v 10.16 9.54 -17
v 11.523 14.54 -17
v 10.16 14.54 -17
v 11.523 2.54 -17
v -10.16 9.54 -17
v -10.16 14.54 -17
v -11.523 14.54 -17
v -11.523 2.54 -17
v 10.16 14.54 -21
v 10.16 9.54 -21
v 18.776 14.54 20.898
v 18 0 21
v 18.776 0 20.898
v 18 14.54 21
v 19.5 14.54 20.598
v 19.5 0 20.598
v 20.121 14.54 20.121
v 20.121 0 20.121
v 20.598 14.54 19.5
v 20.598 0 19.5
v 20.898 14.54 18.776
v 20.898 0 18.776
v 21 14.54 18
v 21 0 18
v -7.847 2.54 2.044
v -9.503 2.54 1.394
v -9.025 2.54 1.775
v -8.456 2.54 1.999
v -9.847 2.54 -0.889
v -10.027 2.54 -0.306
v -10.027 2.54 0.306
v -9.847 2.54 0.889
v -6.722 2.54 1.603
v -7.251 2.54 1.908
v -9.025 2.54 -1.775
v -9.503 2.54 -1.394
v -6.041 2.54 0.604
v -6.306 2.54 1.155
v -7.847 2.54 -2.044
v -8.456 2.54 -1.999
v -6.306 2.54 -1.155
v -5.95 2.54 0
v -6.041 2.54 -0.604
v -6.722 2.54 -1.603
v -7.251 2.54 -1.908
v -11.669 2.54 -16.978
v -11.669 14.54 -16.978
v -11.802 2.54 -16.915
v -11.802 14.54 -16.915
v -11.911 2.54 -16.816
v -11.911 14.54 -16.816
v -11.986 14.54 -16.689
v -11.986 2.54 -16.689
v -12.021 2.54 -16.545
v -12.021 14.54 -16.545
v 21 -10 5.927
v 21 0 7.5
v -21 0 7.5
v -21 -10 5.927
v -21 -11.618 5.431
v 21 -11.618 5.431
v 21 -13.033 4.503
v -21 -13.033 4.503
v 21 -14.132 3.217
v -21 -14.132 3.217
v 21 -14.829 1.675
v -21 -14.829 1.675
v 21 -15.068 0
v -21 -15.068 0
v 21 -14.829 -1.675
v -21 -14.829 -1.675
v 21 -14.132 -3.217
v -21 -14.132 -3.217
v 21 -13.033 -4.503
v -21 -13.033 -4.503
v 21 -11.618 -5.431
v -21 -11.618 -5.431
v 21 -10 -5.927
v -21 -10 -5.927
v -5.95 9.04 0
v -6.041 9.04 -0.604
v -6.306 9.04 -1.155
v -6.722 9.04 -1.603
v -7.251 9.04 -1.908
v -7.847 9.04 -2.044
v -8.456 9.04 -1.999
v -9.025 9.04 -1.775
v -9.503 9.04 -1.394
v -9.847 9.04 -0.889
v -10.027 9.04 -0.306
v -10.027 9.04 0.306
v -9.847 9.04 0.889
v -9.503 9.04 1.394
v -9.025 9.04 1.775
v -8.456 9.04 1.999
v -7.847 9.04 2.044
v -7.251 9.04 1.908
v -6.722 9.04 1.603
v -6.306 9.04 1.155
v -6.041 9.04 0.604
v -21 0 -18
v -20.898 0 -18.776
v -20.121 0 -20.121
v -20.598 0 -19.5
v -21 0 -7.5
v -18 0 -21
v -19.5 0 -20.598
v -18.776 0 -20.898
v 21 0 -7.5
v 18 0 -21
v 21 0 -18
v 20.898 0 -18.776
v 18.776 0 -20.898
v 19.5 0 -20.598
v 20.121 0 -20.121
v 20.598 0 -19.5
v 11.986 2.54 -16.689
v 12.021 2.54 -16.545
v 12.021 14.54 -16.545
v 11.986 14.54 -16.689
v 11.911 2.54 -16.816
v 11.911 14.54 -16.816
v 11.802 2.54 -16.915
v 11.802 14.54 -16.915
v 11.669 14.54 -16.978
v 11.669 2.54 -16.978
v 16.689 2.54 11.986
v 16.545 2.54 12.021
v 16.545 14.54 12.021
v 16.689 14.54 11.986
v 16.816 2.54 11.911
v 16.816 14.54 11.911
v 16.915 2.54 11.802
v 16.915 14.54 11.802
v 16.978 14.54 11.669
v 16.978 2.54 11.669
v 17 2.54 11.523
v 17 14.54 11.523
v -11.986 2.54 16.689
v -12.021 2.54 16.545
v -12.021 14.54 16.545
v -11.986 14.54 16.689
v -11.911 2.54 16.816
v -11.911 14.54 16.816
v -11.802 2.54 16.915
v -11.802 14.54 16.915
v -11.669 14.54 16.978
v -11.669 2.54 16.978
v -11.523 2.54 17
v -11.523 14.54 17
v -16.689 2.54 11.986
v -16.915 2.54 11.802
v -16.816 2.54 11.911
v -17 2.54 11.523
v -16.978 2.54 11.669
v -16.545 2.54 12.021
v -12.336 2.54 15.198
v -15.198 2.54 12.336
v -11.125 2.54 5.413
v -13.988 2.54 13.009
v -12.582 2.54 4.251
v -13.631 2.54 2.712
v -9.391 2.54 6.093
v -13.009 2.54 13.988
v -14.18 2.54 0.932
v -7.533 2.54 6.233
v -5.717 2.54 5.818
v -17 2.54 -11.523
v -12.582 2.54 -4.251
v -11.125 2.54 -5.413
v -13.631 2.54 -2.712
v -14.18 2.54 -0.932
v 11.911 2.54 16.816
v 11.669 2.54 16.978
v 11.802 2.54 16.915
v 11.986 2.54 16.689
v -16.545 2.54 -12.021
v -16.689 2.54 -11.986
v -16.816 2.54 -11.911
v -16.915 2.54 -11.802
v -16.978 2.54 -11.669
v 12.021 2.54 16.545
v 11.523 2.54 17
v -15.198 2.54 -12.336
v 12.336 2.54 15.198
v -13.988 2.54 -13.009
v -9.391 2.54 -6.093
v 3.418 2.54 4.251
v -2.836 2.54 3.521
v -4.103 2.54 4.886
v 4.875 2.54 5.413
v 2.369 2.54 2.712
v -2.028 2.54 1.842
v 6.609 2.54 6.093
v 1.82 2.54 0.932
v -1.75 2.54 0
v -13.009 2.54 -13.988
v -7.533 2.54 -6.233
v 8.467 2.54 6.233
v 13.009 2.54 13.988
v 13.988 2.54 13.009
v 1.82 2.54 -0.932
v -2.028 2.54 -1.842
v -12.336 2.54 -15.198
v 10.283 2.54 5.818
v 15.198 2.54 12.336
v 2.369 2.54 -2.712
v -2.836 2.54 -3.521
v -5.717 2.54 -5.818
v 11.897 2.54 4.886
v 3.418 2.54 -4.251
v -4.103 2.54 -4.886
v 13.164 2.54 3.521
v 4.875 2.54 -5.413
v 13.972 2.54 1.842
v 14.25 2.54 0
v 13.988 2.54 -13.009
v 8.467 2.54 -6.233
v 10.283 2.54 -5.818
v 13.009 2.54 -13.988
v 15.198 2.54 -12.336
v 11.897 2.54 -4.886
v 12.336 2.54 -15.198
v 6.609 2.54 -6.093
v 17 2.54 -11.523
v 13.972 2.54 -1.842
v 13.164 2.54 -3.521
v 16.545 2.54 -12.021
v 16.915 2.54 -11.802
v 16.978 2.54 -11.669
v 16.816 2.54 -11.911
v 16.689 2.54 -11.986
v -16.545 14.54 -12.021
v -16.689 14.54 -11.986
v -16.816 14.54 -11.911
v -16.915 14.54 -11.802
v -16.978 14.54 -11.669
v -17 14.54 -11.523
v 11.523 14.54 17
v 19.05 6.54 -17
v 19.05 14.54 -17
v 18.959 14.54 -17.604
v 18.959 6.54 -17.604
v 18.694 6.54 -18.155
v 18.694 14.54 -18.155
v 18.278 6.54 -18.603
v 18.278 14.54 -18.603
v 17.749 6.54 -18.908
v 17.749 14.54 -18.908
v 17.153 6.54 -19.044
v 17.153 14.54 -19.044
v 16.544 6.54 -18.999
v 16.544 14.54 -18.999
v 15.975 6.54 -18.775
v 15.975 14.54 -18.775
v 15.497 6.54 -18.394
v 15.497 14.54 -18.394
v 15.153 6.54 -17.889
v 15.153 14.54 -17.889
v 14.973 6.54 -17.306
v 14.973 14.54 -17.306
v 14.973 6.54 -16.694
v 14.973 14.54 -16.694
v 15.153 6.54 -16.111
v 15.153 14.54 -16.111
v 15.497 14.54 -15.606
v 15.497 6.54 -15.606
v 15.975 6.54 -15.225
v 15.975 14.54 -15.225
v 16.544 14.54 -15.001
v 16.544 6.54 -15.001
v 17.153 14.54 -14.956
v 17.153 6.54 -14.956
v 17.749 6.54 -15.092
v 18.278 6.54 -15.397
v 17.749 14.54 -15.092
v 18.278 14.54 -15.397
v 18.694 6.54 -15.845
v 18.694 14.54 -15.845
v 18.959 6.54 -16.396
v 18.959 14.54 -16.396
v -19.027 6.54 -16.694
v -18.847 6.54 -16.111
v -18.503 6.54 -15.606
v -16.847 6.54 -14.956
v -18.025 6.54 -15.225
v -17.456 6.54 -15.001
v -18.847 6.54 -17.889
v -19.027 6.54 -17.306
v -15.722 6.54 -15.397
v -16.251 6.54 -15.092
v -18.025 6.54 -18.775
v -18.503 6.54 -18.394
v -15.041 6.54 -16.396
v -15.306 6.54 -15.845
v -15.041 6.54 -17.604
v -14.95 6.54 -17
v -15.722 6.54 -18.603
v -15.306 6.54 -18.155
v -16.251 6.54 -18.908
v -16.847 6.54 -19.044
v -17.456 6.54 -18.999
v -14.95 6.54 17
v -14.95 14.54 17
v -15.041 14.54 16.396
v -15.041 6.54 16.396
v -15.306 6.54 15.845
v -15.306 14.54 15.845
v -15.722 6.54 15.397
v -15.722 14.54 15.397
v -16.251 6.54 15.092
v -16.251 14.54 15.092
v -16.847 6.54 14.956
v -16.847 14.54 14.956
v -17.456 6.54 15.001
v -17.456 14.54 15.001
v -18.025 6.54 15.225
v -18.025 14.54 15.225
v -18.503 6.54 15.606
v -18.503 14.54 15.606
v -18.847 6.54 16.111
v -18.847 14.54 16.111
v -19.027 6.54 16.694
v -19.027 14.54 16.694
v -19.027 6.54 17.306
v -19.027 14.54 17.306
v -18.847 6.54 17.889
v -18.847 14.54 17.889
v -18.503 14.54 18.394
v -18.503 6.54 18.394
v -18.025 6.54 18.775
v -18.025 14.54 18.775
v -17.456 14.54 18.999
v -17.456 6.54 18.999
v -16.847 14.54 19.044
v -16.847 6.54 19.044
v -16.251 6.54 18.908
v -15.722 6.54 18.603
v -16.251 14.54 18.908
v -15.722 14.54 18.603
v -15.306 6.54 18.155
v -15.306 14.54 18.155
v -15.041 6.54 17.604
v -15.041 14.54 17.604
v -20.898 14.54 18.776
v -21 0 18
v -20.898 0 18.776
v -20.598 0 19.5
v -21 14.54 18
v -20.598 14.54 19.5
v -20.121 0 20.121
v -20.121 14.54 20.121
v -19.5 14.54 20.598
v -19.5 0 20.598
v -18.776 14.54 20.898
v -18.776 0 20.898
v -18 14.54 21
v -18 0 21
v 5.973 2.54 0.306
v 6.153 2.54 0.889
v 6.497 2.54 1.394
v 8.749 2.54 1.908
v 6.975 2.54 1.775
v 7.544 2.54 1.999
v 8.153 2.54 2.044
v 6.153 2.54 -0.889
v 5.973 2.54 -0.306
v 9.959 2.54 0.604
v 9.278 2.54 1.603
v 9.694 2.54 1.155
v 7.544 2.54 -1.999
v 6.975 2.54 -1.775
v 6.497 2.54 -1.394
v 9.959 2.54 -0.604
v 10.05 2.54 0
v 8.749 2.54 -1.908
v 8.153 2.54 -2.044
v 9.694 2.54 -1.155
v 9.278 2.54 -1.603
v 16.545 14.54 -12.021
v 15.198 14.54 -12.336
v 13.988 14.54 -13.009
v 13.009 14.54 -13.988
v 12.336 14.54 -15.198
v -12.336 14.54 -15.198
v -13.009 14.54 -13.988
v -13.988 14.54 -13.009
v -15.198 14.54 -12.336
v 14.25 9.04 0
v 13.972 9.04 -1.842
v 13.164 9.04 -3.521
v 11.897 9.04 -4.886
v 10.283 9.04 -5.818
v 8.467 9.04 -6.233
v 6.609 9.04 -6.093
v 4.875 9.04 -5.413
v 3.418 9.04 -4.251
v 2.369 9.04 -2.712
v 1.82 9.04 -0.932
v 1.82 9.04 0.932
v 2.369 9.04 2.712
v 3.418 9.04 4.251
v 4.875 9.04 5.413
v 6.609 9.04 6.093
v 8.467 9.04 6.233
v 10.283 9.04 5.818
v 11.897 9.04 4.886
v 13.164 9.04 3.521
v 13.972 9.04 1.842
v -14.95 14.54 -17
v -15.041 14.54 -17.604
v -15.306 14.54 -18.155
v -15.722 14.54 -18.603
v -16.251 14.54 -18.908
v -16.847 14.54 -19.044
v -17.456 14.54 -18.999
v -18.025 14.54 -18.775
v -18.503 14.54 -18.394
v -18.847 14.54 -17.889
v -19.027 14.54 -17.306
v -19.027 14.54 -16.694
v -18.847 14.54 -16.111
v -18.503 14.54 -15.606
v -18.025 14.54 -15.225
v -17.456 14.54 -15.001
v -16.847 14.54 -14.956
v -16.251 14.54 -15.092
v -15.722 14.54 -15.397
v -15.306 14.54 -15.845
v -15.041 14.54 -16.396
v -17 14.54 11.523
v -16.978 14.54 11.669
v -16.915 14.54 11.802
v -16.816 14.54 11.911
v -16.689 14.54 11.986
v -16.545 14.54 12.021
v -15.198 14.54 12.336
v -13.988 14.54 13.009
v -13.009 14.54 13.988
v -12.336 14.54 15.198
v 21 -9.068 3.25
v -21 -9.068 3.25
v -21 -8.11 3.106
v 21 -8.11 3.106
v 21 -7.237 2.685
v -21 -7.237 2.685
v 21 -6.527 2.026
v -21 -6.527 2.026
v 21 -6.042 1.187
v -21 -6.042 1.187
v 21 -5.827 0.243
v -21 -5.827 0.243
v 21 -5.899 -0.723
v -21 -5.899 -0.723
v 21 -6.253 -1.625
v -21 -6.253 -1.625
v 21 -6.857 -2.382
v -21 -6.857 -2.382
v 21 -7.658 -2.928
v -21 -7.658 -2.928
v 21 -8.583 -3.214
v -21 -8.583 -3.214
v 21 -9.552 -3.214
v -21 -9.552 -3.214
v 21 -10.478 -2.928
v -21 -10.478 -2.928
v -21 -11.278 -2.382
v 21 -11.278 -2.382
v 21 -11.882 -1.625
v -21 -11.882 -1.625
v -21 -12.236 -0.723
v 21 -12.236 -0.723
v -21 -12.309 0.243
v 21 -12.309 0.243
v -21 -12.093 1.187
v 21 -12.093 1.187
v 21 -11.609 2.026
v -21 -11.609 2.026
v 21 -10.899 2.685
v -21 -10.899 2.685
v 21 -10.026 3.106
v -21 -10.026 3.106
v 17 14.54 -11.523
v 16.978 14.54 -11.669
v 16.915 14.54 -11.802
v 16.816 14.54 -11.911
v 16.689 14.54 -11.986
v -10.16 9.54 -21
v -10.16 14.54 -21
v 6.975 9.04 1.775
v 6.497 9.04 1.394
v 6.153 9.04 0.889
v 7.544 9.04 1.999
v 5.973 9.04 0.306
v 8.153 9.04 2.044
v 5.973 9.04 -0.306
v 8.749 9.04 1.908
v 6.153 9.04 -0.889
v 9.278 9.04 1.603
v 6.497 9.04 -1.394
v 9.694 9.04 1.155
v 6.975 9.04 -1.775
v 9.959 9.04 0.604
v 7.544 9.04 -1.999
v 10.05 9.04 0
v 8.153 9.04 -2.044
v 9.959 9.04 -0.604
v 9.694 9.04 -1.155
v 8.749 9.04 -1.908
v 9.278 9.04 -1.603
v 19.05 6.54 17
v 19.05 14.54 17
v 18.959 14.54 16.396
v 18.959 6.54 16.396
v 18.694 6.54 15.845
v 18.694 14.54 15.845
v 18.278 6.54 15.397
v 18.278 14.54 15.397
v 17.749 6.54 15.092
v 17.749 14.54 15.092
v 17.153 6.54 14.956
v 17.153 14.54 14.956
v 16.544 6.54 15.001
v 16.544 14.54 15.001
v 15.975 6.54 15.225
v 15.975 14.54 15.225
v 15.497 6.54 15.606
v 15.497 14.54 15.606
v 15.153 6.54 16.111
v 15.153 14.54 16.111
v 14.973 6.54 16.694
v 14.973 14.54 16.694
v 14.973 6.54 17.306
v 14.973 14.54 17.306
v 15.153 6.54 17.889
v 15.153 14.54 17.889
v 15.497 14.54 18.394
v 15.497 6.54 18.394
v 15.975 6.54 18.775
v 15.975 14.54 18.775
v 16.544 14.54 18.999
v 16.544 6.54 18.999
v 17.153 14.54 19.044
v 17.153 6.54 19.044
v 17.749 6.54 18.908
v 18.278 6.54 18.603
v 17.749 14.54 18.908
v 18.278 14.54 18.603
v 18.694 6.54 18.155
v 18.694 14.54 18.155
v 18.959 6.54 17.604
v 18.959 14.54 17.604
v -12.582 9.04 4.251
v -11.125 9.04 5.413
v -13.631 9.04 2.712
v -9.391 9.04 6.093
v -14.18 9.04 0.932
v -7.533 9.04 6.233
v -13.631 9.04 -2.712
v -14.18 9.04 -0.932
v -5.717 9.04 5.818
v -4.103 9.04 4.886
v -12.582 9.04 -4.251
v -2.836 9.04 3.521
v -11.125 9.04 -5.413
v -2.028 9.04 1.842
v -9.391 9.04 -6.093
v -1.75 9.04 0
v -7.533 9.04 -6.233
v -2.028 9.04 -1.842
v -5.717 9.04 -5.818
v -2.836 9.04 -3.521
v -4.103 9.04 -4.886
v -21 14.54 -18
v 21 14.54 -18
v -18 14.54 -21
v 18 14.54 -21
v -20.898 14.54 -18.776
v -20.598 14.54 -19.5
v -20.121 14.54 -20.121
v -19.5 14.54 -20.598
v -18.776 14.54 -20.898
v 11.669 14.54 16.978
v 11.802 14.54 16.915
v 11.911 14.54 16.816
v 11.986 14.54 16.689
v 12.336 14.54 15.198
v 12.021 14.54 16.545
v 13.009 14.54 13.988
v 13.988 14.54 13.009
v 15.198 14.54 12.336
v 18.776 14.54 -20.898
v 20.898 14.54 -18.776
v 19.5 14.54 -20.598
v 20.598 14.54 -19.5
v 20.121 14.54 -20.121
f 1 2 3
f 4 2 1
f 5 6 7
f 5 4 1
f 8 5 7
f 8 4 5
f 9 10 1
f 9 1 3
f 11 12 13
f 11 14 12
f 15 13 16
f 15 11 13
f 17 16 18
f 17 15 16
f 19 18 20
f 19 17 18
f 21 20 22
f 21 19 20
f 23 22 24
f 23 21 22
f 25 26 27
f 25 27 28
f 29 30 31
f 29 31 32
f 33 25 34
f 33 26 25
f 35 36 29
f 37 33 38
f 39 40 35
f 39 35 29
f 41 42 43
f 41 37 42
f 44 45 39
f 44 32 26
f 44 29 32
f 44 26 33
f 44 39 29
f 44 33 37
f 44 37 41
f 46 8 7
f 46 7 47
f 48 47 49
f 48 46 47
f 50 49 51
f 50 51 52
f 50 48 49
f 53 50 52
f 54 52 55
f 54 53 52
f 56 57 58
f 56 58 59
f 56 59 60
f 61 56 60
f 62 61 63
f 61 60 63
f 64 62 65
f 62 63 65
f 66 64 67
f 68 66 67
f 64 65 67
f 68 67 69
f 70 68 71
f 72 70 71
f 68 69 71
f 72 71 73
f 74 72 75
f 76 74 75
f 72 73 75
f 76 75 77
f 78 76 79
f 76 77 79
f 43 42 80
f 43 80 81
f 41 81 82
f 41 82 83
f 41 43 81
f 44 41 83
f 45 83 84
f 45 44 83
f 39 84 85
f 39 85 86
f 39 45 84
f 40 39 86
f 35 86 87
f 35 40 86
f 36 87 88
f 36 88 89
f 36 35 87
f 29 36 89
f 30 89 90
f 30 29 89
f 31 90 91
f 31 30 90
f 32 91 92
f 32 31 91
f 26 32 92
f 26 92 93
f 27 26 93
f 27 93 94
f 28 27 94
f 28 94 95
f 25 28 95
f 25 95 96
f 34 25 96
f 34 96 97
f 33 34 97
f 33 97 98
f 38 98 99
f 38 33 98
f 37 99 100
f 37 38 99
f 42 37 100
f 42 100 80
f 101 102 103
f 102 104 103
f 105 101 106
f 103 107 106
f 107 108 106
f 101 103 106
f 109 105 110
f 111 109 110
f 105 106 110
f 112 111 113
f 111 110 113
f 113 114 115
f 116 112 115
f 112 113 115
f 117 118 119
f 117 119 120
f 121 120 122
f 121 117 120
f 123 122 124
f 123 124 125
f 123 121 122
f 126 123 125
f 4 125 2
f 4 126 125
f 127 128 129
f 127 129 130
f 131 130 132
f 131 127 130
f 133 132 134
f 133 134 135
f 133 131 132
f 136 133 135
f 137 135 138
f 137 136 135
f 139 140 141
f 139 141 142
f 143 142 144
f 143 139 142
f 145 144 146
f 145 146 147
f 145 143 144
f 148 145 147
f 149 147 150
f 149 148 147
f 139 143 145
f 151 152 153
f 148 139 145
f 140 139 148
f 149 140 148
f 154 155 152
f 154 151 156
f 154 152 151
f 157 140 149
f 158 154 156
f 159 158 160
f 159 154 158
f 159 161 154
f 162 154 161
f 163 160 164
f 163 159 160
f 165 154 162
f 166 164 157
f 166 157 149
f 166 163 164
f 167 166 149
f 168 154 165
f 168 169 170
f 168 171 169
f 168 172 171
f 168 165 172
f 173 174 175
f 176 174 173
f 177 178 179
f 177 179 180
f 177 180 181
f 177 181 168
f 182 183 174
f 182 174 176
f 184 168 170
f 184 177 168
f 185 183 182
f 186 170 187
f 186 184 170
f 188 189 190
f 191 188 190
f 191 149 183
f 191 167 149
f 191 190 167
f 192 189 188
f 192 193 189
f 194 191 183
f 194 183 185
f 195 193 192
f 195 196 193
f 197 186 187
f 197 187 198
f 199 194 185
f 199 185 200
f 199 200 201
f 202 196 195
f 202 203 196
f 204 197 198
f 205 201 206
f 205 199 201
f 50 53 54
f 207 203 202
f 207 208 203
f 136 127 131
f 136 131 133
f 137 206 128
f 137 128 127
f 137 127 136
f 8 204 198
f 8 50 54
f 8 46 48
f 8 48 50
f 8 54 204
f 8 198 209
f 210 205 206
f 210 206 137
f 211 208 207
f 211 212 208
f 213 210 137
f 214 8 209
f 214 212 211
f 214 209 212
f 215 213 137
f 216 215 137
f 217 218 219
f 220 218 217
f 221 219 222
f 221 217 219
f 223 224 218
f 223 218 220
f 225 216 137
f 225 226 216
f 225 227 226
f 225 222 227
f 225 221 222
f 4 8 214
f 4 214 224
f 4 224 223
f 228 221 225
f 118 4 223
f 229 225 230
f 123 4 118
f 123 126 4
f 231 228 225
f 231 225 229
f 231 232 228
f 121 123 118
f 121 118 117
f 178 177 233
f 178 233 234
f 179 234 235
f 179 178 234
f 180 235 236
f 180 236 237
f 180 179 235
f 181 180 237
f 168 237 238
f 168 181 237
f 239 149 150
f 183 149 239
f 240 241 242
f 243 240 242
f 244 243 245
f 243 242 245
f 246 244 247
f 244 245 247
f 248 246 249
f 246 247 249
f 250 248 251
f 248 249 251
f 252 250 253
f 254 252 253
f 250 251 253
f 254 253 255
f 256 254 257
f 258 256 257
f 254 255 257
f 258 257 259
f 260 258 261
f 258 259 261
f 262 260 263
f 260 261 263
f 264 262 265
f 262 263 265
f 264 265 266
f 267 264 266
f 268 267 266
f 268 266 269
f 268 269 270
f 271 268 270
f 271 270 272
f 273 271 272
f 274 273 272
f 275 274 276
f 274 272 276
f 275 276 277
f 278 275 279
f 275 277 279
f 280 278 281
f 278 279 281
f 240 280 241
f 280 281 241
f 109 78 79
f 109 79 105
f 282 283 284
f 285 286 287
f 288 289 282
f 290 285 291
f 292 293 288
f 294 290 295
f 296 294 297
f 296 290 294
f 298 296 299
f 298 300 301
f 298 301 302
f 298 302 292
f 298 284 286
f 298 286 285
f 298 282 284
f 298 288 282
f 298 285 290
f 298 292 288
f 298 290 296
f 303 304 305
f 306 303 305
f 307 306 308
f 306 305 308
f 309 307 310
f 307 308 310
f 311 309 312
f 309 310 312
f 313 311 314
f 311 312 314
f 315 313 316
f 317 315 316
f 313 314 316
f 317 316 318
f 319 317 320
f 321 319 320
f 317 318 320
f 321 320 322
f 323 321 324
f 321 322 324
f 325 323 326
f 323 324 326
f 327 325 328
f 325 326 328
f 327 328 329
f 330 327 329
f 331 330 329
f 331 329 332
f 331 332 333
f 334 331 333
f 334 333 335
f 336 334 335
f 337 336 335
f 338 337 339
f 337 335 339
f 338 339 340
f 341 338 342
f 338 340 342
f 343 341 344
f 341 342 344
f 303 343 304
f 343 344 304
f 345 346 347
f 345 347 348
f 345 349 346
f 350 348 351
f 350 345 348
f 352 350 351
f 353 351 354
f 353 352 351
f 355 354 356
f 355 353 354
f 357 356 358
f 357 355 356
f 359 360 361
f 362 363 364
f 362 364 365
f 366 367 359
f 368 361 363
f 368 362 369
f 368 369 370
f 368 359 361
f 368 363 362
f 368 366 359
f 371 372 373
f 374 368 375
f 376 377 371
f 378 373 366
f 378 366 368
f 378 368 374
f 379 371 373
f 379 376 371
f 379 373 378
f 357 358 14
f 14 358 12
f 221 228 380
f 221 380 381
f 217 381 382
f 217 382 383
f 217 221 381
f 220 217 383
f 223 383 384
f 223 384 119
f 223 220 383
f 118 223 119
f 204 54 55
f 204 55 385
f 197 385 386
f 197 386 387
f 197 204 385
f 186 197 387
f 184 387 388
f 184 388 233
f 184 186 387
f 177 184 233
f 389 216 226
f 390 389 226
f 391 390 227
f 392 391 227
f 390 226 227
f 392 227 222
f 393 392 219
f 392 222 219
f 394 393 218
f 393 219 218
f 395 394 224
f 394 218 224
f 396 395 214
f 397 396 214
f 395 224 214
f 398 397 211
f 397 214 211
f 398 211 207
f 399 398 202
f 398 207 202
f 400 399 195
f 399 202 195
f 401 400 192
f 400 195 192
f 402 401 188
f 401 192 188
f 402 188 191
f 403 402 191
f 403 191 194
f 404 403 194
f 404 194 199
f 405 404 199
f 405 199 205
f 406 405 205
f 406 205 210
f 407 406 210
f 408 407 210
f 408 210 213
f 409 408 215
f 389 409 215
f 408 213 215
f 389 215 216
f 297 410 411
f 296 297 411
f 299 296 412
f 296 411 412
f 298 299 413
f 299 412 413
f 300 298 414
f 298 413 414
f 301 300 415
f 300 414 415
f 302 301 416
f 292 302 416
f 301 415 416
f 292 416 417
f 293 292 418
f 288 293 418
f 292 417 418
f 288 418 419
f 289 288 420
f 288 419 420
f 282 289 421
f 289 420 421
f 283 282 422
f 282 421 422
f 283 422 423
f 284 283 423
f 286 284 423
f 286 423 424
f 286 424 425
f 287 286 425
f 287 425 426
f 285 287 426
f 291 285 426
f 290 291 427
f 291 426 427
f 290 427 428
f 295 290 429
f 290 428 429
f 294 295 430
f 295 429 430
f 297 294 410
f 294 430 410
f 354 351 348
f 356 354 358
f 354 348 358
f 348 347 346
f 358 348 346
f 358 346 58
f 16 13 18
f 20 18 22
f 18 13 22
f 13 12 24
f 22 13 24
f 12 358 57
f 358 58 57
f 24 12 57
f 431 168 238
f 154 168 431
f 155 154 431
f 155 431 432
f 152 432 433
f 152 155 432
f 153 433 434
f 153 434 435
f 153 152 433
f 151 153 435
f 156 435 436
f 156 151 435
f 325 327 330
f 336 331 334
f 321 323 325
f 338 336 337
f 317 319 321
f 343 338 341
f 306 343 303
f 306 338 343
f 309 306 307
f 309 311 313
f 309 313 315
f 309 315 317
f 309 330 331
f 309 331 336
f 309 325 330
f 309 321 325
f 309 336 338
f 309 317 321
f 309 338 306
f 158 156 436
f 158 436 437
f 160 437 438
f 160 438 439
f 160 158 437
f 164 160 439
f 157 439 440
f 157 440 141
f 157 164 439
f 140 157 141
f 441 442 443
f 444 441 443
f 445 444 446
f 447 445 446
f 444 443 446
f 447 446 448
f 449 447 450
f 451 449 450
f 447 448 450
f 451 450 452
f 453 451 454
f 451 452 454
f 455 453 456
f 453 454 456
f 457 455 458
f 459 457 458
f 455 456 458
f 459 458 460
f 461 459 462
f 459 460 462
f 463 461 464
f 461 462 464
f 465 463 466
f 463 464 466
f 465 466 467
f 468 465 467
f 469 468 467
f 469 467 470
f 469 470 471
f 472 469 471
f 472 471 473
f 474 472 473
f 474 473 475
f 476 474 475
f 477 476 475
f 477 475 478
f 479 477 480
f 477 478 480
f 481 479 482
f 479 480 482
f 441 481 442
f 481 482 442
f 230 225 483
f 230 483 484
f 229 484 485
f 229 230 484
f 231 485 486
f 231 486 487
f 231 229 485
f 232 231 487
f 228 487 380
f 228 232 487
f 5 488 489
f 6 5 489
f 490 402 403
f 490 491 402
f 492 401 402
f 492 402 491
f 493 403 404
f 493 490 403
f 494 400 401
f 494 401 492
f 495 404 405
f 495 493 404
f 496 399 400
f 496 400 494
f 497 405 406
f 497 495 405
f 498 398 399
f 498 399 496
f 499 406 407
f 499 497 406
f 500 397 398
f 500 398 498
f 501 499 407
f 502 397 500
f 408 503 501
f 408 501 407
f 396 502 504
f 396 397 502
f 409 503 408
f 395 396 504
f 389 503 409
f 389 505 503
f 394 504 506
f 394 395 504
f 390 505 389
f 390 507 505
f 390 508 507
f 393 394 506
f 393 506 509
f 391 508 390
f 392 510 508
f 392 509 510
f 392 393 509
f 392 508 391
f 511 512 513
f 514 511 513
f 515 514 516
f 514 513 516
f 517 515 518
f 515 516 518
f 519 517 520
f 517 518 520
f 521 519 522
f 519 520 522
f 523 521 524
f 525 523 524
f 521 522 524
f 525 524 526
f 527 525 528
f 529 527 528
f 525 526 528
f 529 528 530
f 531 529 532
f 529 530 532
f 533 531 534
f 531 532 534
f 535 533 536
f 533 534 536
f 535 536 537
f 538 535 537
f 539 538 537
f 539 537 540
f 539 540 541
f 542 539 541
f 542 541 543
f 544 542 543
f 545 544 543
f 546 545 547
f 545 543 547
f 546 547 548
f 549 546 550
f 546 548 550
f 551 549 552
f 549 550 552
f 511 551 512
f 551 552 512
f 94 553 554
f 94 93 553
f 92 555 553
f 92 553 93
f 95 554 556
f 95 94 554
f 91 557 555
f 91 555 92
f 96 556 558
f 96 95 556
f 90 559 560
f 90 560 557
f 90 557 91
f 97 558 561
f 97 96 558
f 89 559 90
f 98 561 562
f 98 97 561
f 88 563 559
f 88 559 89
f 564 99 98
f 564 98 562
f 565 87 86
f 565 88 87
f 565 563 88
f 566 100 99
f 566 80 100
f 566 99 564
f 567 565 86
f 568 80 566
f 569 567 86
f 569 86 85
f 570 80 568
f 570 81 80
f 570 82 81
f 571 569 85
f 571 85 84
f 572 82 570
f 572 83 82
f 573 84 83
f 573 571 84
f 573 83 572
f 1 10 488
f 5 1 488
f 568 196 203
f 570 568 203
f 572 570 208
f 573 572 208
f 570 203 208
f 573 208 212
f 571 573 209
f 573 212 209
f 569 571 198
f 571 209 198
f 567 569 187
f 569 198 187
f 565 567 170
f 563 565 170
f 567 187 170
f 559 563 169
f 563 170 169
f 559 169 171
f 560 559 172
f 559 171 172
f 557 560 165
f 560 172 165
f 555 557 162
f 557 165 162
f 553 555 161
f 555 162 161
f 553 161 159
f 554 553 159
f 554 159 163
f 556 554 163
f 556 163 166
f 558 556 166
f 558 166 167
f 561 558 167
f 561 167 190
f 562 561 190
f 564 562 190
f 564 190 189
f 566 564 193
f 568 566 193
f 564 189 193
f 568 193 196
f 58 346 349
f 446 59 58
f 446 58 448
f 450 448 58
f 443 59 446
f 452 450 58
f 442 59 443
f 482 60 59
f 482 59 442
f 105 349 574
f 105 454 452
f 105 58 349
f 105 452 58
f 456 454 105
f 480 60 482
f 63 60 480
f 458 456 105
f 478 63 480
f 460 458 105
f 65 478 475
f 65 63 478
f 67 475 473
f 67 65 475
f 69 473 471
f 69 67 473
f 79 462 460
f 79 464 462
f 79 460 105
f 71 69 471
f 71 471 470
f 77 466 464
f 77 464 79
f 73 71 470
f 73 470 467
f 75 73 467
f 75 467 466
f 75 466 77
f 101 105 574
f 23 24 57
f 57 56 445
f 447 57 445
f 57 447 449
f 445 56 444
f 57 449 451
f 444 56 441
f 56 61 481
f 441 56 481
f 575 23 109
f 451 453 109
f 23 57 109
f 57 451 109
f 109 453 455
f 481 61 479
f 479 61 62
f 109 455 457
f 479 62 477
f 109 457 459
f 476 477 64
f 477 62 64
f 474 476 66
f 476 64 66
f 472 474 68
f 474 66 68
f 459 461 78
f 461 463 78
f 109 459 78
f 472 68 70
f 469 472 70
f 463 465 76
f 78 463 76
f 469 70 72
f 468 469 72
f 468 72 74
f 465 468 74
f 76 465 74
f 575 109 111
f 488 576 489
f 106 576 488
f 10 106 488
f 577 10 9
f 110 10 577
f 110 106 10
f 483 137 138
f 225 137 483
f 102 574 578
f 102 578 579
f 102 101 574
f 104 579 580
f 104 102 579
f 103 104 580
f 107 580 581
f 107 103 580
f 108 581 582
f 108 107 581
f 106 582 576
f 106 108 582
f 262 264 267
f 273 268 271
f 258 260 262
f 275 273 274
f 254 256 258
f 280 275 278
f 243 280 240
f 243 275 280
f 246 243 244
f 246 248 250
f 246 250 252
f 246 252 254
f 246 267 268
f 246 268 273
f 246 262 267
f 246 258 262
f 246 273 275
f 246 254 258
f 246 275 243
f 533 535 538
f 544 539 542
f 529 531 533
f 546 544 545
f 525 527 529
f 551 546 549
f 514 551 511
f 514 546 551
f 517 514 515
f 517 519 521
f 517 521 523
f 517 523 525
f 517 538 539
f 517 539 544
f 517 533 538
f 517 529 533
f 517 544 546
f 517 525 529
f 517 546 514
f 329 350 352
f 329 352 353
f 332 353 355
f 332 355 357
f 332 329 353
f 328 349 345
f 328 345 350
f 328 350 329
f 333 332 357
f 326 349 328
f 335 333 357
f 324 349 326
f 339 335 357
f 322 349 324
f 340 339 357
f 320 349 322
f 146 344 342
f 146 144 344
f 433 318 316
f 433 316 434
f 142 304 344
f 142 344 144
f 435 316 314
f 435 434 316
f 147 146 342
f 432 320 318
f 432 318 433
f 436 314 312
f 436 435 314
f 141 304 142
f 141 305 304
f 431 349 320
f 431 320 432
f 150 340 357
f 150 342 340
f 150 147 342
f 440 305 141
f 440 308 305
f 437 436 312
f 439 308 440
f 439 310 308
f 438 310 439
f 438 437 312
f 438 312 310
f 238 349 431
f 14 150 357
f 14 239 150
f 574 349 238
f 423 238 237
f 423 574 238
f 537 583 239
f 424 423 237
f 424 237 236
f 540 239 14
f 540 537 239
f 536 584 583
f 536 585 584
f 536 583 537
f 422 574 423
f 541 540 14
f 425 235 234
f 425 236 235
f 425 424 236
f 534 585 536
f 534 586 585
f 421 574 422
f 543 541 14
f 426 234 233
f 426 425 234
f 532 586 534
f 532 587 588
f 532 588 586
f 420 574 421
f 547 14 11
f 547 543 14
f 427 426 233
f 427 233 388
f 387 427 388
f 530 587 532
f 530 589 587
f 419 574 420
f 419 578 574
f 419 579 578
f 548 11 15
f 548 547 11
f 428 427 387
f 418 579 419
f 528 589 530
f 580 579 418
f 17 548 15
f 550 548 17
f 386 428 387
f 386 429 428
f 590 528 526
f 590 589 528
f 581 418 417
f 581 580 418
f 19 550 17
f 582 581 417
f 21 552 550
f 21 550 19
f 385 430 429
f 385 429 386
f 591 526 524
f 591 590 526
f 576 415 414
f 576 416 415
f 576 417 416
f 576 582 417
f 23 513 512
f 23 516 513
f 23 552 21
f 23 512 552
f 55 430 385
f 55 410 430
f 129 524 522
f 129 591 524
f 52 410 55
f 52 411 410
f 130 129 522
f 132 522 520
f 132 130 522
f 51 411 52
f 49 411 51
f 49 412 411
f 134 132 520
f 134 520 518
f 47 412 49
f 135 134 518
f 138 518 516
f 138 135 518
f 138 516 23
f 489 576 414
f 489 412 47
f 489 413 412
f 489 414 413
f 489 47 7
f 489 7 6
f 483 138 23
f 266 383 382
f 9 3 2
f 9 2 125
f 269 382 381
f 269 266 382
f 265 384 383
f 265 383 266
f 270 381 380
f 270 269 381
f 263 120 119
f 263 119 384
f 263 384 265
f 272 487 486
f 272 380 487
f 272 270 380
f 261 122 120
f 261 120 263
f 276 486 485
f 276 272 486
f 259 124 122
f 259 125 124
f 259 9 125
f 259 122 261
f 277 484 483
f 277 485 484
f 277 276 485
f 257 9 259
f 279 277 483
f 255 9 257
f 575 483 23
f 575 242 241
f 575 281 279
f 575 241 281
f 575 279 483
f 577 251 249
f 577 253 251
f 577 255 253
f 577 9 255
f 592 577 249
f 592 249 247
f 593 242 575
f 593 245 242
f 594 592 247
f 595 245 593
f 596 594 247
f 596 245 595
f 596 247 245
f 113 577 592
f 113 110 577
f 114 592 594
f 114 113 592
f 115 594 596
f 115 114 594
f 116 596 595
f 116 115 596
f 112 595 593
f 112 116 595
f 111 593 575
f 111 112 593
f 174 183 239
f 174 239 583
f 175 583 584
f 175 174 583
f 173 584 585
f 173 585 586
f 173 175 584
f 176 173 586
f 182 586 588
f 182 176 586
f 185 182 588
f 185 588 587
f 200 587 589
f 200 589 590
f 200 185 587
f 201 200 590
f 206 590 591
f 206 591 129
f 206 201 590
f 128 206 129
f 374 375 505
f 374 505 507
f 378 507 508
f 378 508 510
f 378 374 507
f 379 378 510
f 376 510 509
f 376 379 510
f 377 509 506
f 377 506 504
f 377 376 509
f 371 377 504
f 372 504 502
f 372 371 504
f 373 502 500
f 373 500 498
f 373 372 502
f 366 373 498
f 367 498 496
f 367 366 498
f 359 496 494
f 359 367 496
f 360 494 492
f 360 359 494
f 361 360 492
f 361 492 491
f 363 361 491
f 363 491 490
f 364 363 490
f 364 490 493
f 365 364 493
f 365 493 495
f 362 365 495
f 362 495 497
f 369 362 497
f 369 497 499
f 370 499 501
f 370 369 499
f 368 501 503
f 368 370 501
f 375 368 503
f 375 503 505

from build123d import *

# Parameters (mm, degrees)
SKETCH1_W           = 42
SKETCH1_H           = 42
BOSS_EXTRUDE1_DEPTH = 2.54
SKETCH2_W           = 42
SKETCH2_H           = 42
BOSS_EXTRUDE2_DEPTH = 12
SKETCH4_R           = 3.25
BOSS_EXTRUDE4_DEPTH = 42
SKETCH9_R           = 6.25
SKETCH9_R_2         = 2.05
BOSS_EXTRUDE5_DEPTH = 6.5
SKETCH10_R          = 2.05
CUT_EXTRUDE1_DEPTH  = 8
SKETCH12_W          = 20.32
SKETCH12_H          = 5
CUT_EXTRUDE2_DEPTH  = 4
FILLET1_R           = 3


with BuildPart() as part:
    # Sketch1 → Boss-Extrude1 (new body)
    with BuildSketch(Plane(origin=(0, 0, 0), x_dir=(1, 0, 0), z_dir=(0, 1, 0))):
        Rectangle(SKETCH1_W, SKETCH1_H)
    extrude(amount=BOSS_EXTRUDE1_DEPTH)

    # Sketch2 → Boss-Extrude2 (add)
    with BuildSketch(Plane(origin=(0, 2.54, 0), x_dir=(1, 0, 0), z_dir=(0, 1, 0))):
        Rectangle(SKETCH2_W, SKETCH2_H)
        with BuildLine():
            Line((-17, 11.522774425), (-17, -11.522774425))
            ThreePointArc((-17, -11.522774425), (-16.869274473, -11.859874356), (-16.545454545, -12.020704023))
            ThreePointArc((-16.545454545, -12.020704023), (-13.464466094, -13.464466094), (-12.020704023, -16.545454545))
            ThreePointArc((-12.020704023, -16.545454545), (-11.859874356, -16.869274473), (-11.522774425, -17))
            Line((-11.522774425, -17), (11.522774425, -17))
            ThreePointArc((11.522774425, -17), (11.859874356, -16.869274473), (12.020704023, -16.545454545))
            ThreePointArc((12.020704023, -16.545454545), (13.464466094, -13.464466094), (16.545454545, -12.020704023))
            ThreePointArc((16.545454545, -12.020704023), (16.869274473, -11.859874356), (17, -11.522774425))
            Line((17, -11.522774425), (17, 11.522774425))
            ThreePointArc((17, 11.522774425), (16.869274473, 11.859874356), (16.545454545, 12.020704023))
            ThreePointArc((16.545454545, 12.020704023), (13.464466094, 13.464466094), (12.020704023, 16.545454545))
            ThreePointArc((12.020704023, 16.545454545), (11.859874356, 16.869274473), (11.522774425, 17))
            Line((11.522774425, 17), (-11.522774425, 17))
            ThreePointArc((-11.522774425, 17), (-11.859874356, 16.869274473), (-12.020704023, 16.545454545))
            ThreePointArc((-12.020704023, 16.545454545), (-13.464466094, 13.464466094), (-16.545454545, 12.020704023))
            ThreePointArc((-16.545454545, 12.020704023), (-16.869274473, 11.859874356), (-17, 11.522774425))
        make_face(mode=Mode.SUBTRACT)
    extrude(amount=BOSS_EXTRUDE2_DEPTH)

    # Sketch4 → Boss-Extrude4 (add)
    with BuildSketch(Plane.ZY.offset(21)):
        with BuildLine():
            Line((7.5, 0), (5.927131841, -10))
            ThreePointArc((5.927131841, -10), (0, -15.067740305), (-5.927131841, -10))
            Line((-5.927131841, -10), (-7.5, 0))
            Line((-7.5, 0), (7.5, 0))
        make_face()
        with Locations((0, -9.067740305)):
            Circle(SKETCH4_R, mode=Mode.SUBTRACT)
    extrude(amount=-BOSS_EXTRUDE4_DEPTH)

    # Sketch9 → Boss-Extrude5 (add)
    with BuildSketch(Plane(origin=(0, 2.54, 0), x_dir=(1, 0, 0), z_dir=(0, 1, 0))):
        with Locations((8, 0)):
            Circle(SKETCH9_R)
        with Locations((8, 0)):
            Circle(SKETCH9_R_2, mode=Mode.SUBTRACT)
        with Locations((-8, 0)):
            Circle(SKETCH9_R)
        with Locations((-8, 0)):
            Circle(SKETCH9_R_2, mode=Mode.SUBTRACT)
    extrude(amount=BOSS_EXTRUDE5_DEPTH)

    # Sketch10 → Cut-Extrude1 (cut)
    with BuildSketch(Plane(origin=(0, 14.54, 0), x_dir=(1, 0, 0), z_dir=(0, 1, 0))):
        with Locations((-17, 17)):
            Circle(SKETCH10_R)
        with Locations((17, 17)):
            Circle(SKETCH10_R)
        with Locations((-17, -17)):
            Circle(SKETCH10_R)
        with Locations((17, -17)):
            Circle(SKETCH10_R)
    extrude(amount=-CUT_EXTRUDE1_DEPTH, mode=Mode.SUBTRACT)

    # Sketch12 → Cut-Extrude2 (cut)
    with BuildSketch(Plane(origin=(0, 0, -21), x_dir=(-1, 0, 0), z_dir=(0, 0, -1))):
        with Locations((0, 12.04)):
            Rectangle(SKETCH12_W, SKETCH12_H)
    extrude(amount=-CUT_EXTRUDE2_DEPTH, mode=Mode.SUBTRACT)

    # Fillet1
    fillet1_edges = [part.edges().sort_by_distance(p)[0] for p in [
        (21, 7.27, 21),
        (-21, 7.27, 21),
        (-21, 7.27, -21),
        (21, 7.27, -21),
    ]]
    fillet(fillet1_edges, radius=FILLET1_R)


solid = part.part
